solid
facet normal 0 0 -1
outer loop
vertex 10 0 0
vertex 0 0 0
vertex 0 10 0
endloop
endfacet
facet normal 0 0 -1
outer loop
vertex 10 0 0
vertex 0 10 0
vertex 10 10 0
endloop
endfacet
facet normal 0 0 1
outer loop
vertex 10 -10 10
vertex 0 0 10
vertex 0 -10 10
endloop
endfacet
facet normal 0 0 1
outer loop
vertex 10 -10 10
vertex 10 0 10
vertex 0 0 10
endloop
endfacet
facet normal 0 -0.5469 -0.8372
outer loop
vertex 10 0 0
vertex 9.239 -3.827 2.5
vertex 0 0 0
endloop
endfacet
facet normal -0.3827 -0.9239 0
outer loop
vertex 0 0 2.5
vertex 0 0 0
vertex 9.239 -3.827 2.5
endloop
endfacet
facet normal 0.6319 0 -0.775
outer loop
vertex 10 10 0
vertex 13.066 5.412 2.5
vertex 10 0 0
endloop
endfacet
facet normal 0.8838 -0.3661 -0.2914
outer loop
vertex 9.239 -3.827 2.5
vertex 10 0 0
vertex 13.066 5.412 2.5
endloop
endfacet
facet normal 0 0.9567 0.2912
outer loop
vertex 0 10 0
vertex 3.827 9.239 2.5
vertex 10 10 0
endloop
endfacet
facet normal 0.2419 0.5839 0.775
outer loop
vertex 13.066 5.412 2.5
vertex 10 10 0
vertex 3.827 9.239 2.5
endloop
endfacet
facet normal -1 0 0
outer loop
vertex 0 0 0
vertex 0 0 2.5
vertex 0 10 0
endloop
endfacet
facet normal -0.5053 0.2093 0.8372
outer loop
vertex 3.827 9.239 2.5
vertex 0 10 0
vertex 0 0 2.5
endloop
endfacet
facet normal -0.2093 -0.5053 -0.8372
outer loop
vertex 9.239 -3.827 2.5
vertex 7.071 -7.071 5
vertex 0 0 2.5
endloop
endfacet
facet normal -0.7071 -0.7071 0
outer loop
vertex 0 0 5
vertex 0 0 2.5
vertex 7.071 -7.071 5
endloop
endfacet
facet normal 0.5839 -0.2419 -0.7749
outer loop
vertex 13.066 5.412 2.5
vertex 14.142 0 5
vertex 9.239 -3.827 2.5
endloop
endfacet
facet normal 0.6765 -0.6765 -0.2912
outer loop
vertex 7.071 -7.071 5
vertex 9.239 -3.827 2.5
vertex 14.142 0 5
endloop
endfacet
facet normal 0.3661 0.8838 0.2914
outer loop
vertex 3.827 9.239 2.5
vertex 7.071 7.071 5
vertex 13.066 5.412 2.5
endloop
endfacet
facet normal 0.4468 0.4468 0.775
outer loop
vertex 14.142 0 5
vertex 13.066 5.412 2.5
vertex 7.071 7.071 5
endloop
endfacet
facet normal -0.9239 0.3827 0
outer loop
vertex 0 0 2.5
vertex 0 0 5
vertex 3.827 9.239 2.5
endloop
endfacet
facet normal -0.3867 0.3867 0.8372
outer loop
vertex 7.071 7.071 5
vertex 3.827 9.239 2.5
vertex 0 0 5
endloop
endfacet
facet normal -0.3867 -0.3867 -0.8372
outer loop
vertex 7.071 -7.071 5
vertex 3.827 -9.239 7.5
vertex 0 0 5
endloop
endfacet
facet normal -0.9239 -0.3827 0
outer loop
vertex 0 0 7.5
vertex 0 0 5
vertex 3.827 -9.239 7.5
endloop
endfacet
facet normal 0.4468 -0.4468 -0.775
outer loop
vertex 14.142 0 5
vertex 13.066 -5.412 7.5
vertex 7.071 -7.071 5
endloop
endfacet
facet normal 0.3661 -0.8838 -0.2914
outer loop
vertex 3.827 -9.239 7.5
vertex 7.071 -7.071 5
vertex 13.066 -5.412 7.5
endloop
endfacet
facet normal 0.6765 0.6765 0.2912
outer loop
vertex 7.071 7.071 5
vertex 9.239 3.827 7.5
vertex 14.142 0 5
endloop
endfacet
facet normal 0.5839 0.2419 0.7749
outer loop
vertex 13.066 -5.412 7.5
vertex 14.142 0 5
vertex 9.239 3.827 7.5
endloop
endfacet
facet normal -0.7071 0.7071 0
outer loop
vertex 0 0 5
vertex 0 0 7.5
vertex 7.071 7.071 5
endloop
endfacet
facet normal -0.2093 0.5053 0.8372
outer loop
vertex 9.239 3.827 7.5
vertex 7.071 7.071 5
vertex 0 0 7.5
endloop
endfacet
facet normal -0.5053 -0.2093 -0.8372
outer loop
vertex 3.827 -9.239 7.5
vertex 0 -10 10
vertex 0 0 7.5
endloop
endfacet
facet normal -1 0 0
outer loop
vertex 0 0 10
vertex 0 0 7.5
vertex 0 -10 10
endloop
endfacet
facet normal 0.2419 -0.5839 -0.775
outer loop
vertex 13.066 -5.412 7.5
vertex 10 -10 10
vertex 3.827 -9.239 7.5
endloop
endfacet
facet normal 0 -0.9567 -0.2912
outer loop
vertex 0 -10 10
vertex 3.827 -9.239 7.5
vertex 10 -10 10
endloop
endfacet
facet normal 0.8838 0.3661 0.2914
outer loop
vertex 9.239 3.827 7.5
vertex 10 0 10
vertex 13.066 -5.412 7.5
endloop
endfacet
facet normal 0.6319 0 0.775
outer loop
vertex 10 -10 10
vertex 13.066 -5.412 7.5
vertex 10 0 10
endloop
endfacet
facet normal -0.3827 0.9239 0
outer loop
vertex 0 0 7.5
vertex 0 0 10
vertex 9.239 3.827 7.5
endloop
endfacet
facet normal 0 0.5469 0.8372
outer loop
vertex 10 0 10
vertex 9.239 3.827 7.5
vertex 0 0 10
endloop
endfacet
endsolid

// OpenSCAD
// `segments=` overrides $fn/$fa/$fs for the profile and composes with an
// explicit slice count.
linear_extrude(height=10, twist=90, slices=4, segments=8, $fn=40) square(10);
